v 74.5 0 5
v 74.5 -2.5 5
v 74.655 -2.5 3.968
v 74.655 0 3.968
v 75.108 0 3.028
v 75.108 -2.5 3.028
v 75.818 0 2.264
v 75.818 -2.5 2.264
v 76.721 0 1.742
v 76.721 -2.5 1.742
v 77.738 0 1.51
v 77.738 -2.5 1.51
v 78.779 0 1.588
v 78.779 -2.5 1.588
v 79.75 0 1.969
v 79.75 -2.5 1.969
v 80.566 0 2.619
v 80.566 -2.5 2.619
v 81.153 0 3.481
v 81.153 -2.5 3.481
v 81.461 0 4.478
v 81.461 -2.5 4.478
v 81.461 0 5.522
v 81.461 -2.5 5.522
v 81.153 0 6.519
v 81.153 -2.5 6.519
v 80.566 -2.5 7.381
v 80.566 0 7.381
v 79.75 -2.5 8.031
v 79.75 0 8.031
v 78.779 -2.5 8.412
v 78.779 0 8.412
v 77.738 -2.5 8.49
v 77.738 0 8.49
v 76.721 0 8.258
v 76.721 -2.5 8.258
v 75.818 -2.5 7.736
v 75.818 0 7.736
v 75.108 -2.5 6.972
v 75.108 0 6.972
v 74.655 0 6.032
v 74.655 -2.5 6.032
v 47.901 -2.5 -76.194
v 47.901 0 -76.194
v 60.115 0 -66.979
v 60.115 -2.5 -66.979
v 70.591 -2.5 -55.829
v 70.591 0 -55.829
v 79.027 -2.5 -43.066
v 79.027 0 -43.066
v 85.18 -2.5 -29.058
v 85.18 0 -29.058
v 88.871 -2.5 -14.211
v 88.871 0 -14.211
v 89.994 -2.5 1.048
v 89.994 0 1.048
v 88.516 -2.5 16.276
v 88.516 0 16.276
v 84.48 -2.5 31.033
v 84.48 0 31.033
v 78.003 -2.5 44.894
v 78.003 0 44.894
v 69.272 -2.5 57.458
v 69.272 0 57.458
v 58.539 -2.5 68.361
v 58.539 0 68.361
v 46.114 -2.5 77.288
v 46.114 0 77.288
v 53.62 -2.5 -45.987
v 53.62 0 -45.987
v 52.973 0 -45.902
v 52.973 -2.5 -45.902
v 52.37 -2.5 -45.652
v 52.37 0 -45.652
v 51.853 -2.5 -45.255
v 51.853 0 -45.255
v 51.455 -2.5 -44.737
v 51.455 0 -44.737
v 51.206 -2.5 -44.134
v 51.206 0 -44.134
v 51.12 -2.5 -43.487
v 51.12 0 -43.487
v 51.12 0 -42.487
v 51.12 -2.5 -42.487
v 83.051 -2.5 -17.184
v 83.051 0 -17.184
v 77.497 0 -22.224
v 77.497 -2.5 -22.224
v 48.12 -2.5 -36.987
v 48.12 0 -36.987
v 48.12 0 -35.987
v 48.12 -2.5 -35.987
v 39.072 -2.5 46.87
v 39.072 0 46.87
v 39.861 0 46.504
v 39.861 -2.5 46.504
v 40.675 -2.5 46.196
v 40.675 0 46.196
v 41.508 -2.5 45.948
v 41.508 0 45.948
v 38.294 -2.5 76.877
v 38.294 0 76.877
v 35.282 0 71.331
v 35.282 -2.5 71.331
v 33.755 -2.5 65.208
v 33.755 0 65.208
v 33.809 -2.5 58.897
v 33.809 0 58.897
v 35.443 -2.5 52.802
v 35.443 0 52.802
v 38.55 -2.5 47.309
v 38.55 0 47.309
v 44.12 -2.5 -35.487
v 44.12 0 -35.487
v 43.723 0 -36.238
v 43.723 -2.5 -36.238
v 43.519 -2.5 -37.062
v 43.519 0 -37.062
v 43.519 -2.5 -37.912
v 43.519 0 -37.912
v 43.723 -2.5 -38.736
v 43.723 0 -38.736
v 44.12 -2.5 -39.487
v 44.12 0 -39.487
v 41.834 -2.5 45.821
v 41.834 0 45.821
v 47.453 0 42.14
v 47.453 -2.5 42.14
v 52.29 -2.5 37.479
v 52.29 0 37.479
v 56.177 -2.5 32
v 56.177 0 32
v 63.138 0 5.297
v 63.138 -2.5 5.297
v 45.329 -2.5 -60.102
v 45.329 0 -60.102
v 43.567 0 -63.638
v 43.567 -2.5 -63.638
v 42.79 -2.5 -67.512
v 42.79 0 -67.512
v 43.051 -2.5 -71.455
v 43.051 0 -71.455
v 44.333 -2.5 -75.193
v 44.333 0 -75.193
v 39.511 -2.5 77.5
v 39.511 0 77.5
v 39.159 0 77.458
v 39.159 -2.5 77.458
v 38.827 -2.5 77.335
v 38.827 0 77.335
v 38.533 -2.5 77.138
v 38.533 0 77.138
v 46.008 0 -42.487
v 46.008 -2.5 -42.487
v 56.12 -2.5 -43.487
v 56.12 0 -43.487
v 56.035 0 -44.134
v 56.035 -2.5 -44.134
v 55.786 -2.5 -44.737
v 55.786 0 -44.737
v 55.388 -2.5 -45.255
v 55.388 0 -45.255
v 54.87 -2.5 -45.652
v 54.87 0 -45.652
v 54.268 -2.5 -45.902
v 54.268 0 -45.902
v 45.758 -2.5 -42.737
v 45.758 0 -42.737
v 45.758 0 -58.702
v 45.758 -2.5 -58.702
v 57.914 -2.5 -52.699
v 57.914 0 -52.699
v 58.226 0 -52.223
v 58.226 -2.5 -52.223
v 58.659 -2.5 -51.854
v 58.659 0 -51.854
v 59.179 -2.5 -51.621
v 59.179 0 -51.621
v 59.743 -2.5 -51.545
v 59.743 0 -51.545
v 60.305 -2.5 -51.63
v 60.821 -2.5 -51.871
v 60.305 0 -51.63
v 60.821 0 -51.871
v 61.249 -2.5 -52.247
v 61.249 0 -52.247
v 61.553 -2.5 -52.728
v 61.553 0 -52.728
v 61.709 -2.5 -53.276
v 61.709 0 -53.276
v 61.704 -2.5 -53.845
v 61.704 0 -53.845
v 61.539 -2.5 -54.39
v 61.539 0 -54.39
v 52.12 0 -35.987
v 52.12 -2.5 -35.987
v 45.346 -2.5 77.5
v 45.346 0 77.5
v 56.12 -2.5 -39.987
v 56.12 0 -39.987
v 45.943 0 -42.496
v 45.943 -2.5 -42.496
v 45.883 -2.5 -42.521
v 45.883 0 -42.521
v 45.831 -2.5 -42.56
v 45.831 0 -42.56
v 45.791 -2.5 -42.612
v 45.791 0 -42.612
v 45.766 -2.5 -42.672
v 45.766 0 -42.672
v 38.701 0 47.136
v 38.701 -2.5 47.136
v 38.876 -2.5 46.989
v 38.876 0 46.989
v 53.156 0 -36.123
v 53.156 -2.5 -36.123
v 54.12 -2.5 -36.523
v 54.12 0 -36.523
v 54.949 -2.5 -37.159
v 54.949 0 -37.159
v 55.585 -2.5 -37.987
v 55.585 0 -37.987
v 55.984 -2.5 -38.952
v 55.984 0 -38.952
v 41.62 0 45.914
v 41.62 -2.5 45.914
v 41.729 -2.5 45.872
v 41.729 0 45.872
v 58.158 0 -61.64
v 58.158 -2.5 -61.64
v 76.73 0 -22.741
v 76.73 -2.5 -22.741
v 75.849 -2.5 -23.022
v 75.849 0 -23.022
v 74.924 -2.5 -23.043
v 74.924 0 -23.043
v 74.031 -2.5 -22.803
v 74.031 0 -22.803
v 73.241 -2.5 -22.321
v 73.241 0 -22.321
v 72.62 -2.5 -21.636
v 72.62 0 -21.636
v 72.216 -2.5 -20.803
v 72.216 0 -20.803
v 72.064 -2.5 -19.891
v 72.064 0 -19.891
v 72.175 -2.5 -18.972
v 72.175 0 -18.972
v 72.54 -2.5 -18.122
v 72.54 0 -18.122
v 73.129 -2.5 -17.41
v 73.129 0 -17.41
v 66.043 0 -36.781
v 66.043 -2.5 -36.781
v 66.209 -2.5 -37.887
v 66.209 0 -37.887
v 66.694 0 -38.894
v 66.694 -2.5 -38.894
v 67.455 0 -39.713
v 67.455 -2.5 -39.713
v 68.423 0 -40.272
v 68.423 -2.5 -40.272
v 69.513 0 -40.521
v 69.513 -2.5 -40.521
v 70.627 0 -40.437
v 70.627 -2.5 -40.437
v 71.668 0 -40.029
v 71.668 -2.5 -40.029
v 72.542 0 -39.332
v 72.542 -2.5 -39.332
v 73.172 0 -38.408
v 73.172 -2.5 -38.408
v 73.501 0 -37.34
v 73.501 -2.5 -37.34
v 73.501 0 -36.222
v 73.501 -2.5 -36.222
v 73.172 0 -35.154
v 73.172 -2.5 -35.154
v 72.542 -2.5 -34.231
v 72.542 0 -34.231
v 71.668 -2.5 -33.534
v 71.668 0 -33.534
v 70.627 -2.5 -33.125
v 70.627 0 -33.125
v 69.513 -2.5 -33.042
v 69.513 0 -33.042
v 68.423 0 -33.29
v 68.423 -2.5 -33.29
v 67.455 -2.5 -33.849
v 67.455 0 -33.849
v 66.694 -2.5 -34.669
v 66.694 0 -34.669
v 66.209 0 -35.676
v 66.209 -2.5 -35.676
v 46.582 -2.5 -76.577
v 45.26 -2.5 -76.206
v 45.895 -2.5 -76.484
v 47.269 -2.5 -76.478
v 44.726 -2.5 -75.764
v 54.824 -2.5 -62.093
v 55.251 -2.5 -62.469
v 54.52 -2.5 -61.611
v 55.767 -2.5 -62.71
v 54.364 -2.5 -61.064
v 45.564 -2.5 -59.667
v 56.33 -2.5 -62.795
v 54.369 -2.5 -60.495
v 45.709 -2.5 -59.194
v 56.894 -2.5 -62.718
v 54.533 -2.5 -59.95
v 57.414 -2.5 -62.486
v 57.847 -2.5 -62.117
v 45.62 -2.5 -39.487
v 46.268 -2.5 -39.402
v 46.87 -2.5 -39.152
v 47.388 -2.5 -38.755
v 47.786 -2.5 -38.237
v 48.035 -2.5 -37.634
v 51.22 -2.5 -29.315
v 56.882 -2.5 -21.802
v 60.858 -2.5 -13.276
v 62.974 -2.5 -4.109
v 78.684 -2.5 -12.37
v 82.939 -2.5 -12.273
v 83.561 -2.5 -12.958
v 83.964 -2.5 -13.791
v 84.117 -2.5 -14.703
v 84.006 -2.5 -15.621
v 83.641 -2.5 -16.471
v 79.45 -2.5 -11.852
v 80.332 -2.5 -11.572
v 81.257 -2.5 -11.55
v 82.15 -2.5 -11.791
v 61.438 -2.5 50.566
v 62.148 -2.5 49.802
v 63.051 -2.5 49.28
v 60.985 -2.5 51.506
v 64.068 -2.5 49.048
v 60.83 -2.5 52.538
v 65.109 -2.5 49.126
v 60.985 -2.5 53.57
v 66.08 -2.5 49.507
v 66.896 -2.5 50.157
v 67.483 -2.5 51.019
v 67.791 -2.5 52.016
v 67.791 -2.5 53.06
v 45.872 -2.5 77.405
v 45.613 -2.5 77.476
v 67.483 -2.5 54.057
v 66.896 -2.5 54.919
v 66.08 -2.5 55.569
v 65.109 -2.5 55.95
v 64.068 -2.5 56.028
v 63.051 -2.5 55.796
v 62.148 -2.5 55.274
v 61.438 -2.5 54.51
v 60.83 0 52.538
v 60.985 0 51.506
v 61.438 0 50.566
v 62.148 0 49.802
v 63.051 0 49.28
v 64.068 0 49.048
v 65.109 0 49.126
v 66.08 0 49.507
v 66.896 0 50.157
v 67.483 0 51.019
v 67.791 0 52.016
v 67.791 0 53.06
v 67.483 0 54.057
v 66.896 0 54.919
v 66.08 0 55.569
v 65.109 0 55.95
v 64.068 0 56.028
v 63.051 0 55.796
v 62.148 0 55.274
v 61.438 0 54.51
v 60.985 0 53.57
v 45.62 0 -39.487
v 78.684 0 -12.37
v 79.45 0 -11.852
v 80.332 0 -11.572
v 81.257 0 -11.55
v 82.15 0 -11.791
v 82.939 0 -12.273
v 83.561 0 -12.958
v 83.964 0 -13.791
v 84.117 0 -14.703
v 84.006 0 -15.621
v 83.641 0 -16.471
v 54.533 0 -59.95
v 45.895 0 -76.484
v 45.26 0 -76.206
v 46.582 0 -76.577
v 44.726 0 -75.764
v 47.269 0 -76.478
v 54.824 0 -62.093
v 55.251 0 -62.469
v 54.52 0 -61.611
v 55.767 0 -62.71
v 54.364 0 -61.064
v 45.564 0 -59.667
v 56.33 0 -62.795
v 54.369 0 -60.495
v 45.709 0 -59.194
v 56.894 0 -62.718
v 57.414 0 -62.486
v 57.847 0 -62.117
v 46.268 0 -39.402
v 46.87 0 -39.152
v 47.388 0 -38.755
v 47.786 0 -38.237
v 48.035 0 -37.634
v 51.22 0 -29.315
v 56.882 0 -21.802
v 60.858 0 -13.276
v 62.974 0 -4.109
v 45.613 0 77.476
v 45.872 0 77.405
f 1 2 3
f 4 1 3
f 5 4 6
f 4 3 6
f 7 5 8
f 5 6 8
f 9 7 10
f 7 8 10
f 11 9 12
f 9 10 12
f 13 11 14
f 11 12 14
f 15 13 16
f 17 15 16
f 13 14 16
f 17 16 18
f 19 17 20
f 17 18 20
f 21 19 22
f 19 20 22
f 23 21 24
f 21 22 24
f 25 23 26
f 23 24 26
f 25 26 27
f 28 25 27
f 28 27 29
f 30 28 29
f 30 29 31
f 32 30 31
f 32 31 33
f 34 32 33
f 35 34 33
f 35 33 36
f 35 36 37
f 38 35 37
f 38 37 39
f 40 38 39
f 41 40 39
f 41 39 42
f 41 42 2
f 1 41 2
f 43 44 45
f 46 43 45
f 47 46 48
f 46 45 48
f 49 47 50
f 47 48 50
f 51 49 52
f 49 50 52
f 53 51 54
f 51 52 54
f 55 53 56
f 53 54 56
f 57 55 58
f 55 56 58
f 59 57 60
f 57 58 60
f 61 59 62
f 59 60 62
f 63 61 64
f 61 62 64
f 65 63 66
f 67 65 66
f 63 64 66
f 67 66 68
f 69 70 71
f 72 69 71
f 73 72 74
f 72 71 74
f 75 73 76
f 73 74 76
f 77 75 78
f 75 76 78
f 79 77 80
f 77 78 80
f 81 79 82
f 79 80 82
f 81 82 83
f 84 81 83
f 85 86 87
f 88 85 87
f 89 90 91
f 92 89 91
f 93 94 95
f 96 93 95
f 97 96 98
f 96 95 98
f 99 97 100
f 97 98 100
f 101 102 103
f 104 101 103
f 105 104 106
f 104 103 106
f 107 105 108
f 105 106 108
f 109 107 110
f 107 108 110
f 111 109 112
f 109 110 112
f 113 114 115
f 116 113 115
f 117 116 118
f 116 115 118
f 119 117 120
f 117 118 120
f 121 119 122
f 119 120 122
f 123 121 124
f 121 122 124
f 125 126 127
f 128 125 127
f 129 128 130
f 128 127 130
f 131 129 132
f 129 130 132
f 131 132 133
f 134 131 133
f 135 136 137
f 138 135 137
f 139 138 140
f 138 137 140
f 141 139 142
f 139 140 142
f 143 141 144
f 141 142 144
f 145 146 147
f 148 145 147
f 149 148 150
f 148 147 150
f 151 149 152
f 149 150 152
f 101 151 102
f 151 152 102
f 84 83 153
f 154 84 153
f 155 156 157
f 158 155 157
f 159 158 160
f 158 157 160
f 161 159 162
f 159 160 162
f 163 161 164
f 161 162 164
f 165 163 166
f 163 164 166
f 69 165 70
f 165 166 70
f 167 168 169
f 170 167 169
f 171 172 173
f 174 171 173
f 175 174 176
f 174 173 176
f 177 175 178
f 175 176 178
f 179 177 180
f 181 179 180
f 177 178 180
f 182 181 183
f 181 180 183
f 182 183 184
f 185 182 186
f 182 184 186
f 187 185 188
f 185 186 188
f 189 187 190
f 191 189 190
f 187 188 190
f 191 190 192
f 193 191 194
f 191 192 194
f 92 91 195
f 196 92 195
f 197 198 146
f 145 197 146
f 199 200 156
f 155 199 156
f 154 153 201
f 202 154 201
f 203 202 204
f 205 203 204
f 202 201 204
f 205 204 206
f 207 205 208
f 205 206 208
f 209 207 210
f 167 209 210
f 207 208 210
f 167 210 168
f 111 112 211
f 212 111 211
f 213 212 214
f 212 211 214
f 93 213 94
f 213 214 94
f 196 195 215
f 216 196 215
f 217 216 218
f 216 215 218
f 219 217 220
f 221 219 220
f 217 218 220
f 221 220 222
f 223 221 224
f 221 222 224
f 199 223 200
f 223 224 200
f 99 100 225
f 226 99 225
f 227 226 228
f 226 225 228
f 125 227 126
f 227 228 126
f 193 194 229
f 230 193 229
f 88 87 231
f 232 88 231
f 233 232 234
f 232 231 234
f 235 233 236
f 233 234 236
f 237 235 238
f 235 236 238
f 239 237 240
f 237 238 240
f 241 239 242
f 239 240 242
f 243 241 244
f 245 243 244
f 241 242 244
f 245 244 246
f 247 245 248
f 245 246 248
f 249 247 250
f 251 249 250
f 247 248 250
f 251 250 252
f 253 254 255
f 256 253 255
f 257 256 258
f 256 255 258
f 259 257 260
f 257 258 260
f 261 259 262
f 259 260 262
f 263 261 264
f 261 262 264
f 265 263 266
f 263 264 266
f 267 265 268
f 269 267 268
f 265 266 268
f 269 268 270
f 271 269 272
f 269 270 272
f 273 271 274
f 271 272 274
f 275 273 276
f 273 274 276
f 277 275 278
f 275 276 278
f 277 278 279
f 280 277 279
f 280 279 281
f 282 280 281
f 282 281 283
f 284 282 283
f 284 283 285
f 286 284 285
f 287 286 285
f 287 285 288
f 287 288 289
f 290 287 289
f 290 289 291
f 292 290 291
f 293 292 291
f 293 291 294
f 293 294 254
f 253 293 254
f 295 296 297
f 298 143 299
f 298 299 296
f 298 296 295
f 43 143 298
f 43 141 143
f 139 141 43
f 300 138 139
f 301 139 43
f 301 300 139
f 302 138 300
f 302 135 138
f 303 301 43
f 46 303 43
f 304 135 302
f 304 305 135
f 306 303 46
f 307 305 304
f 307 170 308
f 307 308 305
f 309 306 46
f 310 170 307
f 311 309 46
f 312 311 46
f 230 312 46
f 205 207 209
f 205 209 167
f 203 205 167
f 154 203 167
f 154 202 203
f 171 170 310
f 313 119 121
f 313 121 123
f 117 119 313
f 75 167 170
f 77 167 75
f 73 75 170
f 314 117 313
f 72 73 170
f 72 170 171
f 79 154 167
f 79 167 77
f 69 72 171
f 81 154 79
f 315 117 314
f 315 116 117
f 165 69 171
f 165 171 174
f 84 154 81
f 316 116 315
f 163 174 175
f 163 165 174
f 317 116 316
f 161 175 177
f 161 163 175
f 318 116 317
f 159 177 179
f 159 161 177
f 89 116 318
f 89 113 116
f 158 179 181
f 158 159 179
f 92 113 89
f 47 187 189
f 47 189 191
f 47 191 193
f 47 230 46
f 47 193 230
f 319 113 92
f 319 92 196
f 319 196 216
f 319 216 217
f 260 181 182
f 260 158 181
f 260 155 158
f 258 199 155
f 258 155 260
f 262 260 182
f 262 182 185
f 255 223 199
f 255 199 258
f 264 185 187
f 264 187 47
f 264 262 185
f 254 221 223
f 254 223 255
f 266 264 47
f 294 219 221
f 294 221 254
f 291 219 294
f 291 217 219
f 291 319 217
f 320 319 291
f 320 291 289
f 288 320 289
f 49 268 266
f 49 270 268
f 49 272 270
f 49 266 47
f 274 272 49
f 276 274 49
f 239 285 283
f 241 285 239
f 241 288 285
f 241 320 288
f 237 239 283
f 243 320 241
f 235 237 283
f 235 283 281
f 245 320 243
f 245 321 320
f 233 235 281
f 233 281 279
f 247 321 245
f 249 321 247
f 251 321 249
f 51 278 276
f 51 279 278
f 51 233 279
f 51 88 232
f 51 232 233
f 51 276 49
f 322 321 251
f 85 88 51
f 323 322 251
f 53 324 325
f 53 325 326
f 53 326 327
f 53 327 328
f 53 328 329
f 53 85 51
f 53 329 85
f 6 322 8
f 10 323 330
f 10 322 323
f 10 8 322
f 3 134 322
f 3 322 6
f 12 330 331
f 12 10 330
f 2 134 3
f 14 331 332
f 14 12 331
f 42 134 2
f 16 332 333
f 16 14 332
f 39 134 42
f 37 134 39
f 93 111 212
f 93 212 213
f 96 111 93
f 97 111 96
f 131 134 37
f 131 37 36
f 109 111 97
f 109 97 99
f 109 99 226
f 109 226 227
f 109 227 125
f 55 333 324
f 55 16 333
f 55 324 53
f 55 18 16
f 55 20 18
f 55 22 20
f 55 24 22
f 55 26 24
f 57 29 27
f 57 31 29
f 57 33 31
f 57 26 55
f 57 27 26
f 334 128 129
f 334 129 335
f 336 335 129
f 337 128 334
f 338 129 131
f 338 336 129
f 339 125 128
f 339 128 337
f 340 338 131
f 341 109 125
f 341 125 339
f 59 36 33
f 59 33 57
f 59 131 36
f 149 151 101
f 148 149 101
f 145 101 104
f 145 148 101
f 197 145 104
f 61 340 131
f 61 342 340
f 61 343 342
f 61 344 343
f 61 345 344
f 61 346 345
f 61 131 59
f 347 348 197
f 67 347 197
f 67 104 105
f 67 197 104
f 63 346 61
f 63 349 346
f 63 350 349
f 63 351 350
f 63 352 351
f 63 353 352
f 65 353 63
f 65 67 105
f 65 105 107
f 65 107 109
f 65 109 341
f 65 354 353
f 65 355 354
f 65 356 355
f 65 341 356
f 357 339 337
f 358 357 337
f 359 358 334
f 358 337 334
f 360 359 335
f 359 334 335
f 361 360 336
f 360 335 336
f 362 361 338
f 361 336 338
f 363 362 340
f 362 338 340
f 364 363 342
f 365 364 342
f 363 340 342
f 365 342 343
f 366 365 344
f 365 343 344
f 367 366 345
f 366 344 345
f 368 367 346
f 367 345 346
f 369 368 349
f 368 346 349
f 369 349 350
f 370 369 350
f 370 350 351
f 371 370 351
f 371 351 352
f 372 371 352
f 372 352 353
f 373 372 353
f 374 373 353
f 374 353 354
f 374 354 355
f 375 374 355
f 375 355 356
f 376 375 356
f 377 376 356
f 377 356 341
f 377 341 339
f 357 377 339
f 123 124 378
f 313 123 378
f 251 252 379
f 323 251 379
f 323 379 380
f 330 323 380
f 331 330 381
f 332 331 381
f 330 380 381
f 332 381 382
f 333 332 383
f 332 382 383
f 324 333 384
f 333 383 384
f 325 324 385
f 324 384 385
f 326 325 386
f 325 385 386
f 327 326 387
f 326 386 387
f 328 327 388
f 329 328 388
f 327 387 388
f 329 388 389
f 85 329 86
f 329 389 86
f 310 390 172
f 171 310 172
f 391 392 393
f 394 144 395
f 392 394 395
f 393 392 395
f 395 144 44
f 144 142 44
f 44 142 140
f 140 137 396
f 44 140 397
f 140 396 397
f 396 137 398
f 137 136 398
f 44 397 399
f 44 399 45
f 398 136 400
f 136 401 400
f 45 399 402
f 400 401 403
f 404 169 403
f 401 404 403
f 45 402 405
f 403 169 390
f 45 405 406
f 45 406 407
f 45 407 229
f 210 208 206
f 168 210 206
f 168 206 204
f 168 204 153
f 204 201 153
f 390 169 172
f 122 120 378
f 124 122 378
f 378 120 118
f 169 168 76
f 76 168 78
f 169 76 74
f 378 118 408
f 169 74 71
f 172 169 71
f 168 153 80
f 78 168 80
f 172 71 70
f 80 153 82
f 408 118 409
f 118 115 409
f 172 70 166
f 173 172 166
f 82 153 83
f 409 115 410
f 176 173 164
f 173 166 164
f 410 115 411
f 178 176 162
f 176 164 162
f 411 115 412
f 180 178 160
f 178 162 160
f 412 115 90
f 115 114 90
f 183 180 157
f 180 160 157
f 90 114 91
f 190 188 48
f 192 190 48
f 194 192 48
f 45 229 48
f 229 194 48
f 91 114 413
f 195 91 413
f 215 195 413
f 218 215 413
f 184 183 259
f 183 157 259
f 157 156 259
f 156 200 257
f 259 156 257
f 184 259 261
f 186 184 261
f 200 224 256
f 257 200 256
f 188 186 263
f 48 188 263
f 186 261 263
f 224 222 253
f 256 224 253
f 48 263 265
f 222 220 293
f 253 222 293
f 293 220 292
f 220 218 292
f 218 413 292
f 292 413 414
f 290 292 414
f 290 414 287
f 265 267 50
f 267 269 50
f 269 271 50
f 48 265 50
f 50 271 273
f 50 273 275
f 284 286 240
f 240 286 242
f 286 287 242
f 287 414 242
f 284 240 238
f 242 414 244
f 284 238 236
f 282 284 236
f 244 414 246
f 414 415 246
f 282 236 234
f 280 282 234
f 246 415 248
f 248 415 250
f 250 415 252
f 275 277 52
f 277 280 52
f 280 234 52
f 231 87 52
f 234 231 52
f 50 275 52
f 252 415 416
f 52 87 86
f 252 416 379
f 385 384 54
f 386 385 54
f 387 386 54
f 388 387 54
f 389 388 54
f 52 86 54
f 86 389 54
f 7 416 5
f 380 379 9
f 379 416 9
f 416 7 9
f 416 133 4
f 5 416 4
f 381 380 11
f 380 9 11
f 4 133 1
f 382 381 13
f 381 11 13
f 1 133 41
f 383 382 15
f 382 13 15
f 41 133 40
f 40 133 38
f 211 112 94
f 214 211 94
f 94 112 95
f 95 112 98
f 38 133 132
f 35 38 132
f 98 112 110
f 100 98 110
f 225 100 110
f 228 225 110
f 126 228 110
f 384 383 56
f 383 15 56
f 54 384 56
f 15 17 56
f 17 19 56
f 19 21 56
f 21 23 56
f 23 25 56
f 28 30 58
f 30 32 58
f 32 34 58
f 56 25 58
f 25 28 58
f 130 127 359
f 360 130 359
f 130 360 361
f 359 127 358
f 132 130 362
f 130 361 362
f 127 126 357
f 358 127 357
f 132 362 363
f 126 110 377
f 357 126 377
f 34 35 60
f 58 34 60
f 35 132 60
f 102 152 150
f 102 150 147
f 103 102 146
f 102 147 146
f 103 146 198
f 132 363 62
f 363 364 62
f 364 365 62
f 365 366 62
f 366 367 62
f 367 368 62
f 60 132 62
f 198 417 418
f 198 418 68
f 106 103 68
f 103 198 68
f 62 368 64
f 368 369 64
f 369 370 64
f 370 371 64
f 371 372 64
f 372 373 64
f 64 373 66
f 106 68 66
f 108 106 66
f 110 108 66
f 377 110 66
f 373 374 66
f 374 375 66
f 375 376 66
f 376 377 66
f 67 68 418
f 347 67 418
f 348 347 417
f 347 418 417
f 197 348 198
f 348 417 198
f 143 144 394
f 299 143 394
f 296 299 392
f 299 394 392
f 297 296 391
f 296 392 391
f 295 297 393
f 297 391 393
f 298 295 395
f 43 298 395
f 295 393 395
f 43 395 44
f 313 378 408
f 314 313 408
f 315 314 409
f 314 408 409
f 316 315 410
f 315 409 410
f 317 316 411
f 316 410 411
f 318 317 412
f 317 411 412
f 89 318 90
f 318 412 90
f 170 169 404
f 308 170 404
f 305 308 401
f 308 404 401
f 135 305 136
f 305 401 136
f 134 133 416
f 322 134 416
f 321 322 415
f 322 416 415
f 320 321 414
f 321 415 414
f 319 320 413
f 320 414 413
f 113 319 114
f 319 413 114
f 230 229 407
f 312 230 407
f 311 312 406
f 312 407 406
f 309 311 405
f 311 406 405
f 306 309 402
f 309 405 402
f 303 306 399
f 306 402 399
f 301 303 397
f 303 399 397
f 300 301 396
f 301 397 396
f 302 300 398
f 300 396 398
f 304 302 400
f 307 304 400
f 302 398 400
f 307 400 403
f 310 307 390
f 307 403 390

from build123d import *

# Parameters (mm, degrees)
F1_DEPTH = 2.5
F2_D     = 7
F3_D     = 7.5


with BuildPart() as f1:
    # F0 (on Front) → F1 (new body)
    with BuildSketch(Plane.XZ):
        with BuildLine():
            ThreePointArc((44.3332993401, -75.1925694933), (45.8953218526, -76.4841948767), (47.9012588134, -76.1936309943))
            ThreePointArc((47.9012588134, -76.1936309943), (89.9939017876, 1.0476836528), (46.1144673234, 77.2881355932))
            ThreePointArc((46.1144673234, 77.2881355932), (45.7445133706, 77.4460642084), (45.345892868, 77.5))
            Line((45.345892868, 77.5), (39.5109278697, 77.5))
            ThreePointArc((39.5109278697, 77.5), (38.8271106657, 77.3350633062), (38.2936755268, 76.8765253754))
            ThreePointArc((38.2936755268, 76.8765253754), (33.5821559497, 62.0508178423), (38.5502726955, 47.3091138504))
            ThreePointArc((38.5502726955, 47.3091138504), (38.7858981986, 47.059289436), (39.0721677836, 46.8696019548))
            ThreePointArc((39.0721677836, 46.8696019548), (40.2651851973, 46.3424047588), (41.5083731547, 45.9478022555))
            ThreePointArc((41.5083731547, 45.9478022555), (41.6750655835, 45.8941514704), (41.8343694623, 45.8214393893))
            ThreePointArc((41.8343694623, 45.8214393893), (49.9805703397, 39.922405473), (56.1769145362, 32))
            Line((56.1769145362, 32), (63.1382883672, 5.2967772755))
            ThreePointArc((63.1382883672, 5.2967772755), (59.0933773697, -17.6430529265), (44.1204665888, -35.4870731412))
            ThreePointArc((44.1204665888, -35.4870731412), (43.4927479121, -37.4870731412), (44.1204665888, -39.4870731412))
            Line((44.1204665888, -39.4870731412), (45.6204665888, -39.4870731412))
            ThreePointArc((45.6204665888, -39.4870731412), (47.3882335418, -38.7548400941), (48.1204665888, -36.9870731412))
            Line((48.1204665888, -36.9870731412), (48.1204665888, -35.9870731412))
            Line((48.1204665888, -35.9870731412), (52.1204665888, -35.9870731412))
            ThreePointArc((52.1204665888, -35.9870731412), (54.9488937136, -37.1586460164), (56.1204665888, -39.9870731412))
            Line((56.1204665888, -39.9870731412), (56.1204665888, -43.4870731412))
            ThreePointArc((56.1204665888, -43.4870731412), (55.3882335418, -45.2548400941), (53.6204665888, -45.9870731412))
            ThreePointArc((53.6204665888, -45.9870731412), (51.8526996359, -45.2548400941), (51.1204665888, -43.4870731412))
            Line((51.1204665888, -43.4870731412), (51.1204665888, -42.4870731412))
            Line((51.1204665888, -42.4870731412), (46.0075130443, -42.4870731412))
            ThreePointArc((46.0075130443, -42.4870731412), (45.830736349, -42.5602964459), (45.7575130443, -42.7370731412))
            Line((45.7575130443, -42.7370731412), (45.7575130443, -58.7020410289))
            ThreePointArc((45.7575130443, -58.7020410289), (45.647970263, -59.4339660836), (45.3289416157, -60.1017494533))
            ThreePointArc((45.3289416157, -60.1017494533), (42.7900537692, -67.5124966586), (44.3332993401, -75.1925694933))
        make_face()
        with BuildLine():
            ThreePointArc((58.1584893781, -61.6403112281), (55.5006372806, -62.6076902787), (54.53325823, -59.9498381811))
            Line((54.53325823, -59.9498381811), (57.9142043239, -52.6993758848))
            ThreePointArc((57.9142043239, -52.6993758848), (60.5720564215, -51.7319968342), (61.5394354721, -54.3898489318))
            Line((61.5394354721, -54.3898489318), (58.1584893781, -61.6403112281))
        make_face(mode=Mode.SUBTRACT)
        with BuildLine():
            ThreePointArc((78.683841012, -12.3700931974), (83.2746114855, -12.5933116091), (83.0513930738, -17.1840820826))
            Line((83.0513930738, -17.1840820826), (77.4967905139, -22.2235652309))
            ThreePointArc((77.4967905139, -22.2235652309), (72.9060200403, -22.0003468191), (73.1292384521, -17.4095763456))
            Line((73.1292384521, -17.4095763456), (78.683841012, -12.3700931974))
        make_face(mode=Mode.SUBTRACT)
    extrude(amount=F1_DEPTH)

    # F2 (through all)
    with Locations(Plane(origin=(0, 0, 0), x_dir=(1, 0, 0), z_dir=(0, 1, 0))):
        with Locations((64.3298934041, -52.5379906052), (78, -5)):
            Hole(F2_D / 2)

    # F3 (through all)
    with Locations(Plane(origin=(0, 0, 0), x_dir=(1, 0, 0), z_dir=(0, 1, 0))):
        with Locations((69.7928888027, 36.7811946296)):
            Hole(F3_D / 2)


solid = f1.part
